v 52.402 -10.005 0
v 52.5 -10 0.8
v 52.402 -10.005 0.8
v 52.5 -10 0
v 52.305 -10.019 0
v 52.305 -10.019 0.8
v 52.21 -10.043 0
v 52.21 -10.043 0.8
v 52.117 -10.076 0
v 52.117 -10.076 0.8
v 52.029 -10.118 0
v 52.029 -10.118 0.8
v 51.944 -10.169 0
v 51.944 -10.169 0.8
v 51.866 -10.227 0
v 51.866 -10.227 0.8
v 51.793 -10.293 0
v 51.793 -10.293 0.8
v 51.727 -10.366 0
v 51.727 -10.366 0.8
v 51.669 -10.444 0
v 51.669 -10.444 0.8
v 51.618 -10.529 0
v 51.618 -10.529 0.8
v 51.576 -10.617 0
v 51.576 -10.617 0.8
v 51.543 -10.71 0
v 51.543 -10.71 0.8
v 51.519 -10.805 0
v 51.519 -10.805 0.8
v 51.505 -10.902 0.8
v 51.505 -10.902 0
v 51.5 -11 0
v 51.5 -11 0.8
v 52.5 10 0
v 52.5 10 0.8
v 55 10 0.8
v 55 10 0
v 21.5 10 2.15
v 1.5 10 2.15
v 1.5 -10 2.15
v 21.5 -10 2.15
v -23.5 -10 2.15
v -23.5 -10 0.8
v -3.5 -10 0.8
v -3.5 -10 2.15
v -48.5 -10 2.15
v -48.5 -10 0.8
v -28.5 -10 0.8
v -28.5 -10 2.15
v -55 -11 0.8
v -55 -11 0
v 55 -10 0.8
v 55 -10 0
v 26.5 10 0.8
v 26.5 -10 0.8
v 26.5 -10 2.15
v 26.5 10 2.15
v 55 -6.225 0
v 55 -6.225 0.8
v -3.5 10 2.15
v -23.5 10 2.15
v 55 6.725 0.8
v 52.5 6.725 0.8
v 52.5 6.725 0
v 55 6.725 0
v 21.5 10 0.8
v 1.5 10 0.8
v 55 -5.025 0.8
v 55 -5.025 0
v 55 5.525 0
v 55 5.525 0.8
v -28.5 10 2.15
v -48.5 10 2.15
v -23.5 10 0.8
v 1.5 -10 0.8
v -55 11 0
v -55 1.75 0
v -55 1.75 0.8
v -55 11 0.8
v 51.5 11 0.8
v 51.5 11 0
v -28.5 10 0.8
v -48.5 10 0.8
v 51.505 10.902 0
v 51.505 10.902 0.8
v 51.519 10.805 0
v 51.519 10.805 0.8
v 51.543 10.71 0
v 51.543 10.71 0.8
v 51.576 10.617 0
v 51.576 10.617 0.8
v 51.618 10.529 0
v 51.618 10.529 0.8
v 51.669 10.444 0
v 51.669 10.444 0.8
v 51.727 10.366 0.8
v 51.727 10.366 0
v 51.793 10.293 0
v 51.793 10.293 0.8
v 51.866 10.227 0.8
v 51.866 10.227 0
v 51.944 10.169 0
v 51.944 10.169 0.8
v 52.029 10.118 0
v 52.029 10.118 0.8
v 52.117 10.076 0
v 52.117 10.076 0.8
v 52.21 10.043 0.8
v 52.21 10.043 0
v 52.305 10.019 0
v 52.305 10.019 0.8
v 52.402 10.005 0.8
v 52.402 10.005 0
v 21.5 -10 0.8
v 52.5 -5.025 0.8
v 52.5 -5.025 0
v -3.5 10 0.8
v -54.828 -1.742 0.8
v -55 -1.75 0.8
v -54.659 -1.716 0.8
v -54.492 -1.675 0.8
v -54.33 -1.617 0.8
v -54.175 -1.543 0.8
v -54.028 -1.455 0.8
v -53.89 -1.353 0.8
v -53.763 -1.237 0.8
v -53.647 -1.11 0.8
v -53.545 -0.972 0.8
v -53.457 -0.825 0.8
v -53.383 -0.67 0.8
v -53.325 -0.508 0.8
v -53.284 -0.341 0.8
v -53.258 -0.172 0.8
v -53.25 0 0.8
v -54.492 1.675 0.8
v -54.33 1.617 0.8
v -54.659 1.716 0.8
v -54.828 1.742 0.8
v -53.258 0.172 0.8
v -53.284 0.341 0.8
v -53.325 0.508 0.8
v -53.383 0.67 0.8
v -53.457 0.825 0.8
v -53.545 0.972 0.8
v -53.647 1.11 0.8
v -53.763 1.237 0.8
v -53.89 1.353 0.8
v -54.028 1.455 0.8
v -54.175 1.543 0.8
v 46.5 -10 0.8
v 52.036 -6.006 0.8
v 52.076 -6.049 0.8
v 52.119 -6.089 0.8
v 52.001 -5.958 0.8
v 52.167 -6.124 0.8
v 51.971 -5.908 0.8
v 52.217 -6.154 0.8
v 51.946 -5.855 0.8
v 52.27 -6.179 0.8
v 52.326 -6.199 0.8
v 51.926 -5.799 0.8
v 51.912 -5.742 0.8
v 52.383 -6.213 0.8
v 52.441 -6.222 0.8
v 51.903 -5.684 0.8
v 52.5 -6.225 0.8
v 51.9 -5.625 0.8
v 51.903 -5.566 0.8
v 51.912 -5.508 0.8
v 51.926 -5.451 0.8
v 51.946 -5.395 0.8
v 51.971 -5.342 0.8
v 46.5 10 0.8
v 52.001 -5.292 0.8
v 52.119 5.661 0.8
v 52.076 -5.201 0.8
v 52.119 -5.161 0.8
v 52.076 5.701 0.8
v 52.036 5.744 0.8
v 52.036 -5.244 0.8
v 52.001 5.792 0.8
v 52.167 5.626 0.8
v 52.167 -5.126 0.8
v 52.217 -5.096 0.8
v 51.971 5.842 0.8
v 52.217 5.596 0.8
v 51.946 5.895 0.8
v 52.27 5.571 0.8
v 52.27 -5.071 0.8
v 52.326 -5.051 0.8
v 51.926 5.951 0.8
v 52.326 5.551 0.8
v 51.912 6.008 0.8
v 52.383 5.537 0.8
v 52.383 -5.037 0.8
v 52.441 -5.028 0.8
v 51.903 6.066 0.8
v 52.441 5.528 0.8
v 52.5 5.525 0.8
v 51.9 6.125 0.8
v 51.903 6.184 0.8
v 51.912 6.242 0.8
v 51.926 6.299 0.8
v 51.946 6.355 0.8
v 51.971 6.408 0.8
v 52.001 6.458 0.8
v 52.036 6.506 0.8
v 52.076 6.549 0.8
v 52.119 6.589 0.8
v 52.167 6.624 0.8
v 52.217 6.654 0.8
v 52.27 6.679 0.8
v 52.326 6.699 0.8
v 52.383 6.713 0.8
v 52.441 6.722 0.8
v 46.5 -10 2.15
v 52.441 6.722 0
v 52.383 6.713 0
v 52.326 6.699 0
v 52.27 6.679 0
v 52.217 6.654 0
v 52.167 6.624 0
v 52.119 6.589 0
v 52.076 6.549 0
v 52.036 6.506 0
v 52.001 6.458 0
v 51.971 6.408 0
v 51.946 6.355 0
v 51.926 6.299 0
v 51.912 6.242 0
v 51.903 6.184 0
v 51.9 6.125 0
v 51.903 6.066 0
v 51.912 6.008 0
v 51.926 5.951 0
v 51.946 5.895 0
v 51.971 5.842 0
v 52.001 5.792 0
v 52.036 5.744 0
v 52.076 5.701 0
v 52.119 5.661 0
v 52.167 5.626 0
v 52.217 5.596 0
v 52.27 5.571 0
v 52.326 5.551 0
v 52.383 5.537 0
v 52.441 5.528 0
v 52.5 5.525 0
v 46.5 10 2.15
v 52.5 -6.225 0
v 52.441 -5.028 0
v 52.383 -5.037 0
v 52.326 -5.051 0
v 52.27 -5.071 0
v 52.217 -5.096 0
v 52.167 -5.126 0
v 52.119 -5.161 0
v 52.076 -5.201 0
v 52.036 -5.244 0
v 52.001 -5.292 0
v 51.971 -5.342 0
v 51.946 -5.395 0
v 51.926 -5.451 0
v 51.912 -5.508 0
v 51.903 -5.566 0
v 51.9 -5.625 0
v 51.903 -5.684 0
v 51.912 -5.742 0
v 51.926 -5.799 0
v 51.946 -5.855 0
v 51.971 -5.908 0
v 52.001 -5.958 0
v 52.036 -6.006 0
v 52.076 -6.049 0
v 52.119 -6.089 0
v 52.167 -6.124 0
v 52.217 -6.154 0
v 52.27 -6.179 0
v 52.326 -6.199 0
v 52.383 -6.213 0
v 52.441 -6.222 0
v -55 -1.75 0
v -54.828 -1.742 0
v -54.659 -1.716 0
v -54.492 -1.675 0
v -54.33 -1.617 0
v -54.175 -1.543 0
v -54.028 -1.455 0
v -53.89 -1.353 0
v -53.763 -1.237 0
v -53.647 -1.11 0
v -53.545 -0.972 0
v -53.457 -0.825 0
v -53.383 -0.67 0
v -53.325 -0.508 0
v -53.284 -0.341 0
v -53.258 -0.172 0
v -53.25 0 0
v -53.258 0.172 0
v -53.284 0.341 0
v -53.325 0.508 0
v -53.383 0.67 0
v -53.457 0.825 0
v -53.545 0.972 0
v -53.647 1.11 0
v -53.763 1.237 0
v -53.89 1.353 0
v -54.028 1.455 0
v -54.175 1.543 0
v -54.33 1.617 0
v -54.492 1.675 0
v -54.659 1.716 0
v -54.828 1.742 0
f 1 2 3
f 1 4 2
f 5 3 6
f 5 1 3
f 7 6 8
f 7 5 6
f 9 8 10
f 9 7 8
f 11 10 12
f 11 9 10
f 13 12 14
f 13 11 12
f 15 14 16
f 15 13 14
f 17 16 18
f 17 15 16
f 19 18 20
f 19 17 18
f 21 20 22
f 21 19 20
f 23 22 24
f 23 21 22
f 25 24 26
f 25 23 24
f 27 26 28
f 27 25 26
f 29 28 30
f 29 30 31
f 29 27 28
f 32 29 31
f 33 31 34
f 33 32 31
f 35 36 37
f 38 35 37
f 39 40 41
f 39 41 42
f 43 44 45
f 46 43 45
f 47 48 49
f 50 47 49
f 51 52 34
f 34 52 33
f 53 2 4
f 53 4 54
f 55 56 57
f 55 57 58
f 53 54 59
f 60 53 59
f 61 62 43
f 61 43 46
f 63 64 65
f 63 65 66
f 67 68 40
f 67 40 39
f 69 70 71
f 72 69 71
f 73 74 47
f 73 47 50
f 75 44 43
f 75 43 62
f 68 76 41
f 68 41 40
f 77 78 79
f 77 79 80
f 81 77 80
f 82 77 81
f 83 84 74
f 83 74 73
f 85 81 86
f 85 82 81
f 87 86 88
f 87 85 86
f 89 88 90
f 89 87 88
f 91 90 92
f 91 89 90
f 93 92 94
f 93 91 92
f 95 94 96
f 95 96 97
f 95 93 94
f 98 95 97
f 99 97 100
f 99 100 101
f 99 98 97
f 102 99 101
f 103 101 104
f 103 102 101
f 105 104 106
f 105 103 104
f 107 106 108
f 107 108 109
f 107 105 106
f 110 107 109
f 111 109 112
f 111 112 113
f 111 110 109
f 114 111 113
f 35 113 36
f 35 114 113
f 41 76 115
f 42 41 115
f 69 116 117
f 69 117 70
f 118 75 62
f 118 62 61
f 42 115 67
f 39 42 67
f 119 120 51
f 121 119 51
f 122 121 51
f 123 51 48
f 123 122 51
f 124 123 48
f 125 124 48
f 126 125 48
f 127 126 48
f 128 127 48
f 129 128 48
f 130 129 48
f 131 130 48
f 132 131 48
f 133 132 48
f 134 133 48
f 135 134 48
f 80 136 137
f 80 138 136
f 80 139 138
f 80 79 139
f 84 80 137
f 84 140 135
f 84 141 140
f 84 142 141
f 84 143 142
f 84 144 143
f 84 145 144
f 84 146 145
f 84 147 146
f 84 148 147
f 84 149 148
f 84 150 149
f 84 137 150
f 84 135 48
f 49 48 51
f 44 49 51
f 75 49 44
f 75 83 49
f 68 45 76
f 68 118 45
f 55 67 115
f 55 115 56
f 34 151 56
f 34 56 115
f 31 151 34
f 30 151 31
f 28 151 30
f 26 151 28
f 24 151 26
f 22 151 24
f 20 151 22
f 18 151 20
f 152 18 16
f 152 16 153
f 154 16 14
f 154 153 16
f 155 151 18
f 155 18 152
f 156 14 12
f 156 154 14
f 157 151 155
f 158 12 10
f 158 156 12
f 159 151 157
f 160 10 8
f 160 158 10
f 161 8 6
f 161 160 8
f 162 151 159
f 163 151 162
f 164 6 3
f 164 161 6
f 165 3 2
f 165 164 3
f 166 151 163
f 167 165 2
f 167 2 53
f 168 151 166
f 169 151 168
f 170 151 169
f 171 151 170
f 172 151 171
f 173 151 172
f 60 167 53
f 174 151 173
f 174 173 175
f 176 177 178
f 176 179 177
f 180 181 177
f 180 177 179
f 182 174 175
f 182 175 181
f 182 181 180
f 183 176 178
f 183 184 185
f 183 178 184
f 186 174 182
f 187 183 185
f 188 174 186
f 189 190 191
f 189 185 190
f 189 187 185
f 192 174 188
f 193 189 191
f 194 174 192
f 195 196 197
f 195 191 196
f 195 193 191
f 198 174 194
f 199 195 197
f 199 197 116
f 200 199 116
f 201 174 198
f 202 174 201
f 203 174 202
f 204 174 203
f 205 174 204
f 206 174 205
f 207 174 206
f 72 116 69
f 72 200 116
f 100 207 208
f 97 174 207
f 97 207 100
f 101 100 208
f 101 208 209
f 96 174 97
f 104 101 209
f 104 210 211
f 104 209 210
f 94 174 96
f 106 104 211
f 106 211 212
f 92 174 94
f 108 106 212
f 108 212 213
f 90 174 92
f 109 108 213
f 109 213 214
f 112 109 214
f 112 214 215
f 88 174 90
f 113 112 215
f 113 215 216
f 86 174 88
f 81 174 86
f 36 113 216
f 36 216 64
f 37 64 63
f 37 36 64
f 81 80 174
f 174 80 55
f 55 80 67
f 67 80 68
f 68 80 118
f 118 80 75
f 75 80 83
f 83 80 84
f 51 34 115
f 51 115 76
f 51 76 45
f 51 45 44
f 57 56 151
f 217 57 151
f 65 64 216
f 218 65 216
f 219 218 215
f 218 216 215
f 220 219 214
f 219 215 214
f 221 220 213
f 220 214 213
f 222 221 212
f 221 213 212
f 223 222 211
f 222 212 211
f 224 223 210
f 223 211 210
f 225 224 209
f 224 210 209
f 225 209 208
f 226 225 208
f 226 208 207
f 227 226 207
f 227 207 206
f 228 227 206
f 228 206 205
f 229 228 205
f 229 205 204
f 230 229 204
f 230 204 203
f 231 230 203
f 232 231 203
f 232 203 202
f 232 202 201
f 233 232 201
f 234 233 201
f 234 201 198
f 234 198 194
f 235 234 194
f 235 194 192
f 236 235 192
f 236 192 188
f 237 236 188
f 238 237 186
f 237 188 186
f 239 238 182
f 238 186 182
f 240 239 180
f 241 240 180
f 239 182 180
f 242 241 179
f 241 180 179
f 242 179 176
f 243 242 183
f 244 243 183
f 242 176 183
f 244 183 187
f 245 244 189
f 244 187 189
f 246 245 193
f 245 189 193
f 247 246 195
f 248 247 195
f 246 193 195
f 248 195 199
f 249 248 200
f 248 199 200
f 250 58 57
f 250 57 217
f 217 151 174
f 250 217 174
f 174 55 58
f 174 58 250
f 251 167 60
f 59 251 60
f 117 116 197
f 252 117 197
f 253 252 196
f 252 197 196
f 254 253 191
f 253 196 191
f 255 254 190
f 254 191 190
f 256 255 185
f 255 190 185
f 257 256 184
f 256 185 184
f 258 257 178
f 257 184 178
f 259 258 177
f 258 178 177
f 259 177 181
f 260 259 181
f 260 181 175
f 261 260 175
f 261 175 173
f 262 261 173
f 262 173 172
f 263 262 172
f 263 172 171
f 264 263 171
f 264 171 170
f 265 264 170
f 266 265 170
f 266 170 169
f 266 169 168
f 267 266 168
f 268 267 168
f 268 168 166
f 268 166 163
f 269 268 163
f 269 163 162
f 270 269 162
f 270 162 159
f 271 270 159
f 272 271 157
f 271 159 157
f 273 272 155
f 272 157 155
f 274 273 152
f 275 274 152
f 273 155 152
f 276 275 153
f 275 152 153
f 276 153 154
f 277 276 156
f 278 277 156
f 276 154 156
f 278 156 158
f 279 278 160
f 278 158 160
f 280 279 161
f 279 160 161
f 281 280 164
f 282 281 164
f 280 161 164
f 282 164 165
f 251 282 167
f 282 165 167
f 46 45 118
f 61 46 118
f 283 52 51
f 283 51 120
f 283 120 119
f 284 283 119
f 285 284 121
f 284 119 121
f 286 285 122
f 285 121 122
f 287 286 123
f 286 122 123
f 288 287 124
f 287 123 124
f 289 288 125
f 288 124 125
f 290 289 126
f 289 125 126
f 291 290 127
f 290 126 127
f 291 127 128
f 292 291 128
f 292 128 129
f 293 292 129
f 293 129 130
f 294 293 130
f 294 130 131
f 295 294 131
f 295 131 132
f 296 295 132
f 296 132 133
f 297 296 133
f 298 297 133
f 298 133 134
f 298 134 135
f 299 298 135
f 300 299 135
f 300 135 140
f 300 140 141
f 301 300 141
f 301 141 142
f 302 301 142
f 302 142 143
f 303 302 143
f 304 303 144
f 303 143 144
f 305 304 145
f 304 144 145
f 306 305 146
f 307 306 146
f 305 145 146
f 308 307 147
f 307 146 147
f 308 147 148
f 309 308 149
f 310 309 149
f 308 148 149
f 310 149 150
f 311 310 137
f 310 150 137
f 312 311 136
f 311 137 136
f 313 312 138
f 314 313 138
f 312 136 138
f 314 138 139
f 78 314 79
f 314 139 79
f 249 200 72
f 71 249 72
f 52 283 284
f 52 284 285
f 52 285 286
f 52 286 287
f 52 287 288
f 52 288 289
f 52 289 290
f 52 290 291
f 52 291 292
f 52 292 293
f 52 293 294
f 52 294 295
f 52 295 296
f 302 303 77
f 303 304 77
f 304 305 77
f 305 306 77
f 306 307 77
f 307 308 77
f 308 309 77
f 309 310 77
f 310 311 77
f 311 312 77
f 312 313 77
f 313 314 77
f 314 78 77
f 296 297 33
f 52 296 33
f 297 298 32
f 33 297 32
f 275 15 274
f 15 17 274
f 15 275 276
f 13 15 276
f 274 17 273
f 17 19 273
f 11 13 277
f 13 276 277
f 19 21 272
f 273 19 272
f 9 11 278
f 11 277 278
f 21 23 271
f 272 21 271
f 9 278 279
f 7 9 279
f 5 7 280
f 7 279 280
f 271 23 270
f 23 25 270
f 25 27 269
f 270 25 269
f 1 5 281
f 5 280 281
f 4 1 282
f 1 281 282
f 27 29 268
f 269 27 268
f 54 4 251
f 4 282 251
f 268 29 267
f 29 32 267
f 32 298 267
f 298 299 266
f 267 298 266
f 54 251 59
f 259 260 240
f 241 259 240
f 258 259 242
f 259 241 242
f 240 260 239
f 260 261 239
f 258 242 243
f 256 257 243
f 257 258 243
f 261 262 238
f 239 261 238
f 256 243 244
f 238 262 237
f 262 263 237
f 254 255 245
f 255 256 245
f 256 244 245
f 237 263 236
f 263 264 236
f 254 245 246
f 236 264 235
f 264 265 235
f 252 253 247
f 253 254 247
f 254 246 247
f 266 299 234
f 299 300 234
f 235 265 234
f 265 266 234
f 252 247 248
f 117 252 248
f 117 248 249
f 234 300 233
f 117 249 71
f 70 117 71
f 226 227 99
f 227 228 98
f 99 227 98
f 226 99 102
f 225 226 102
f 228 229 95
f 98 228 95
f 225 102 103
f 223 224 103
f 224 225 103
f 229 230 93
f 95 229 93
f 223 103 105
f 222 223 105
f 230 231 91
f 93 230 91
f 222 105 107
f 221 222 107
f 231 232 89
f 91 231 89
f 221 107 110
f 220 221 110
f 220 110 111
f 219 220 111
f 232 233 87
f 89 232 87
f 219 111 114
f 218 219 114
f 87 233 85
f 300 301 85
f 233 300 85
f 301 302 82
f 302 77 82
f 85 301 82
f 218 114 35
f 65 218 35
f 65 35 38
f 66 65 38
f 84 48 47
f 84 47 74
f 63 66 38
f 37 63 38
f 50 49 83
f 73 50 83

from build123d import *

# Parameters (mm, degrees)
F0_W     = 110
F0_H     = 22
F1_DEPTH = 0.8
F2_W     = 3.5
F2_H     = 1
F2_W_2   = 2.5
F2_H_2   = 1.2
F3_DEPTH = 0.801
F4_R     = 0.99999
F2_W_3   = 20
F2_H_3   = 20
F5_DEPTH = 1.35


# Not quite as in the source:
# - a fillet or chamfer is up to 0.001 mm smaller than in the source, because OpenCascade refuses the exact size


with BuildPart() as f1:
    # F0 (on Top) → F1 (new body)
    with BuildSketch(Plane.XY):
        Rectangle(F0_W, F0_H)
    extrude(amount=F1_DEPTH)

    # F2 (on face) → F3 (cut, through all)
    with BuildSketch(Plane.XY.offset(0.8)):
        with BuildLine():
            Line((-55, 1.75), (-55, -1.75))
            ThreePointArc((-55, -1.75), (-53.25, 0), (-55, 1.75))
        make_face()
        with Locations((53.25, 10.5)):
            Rectangle(F2_W, F2_H)
        with Locations((53.25, -10.5)):
            Rectangle(F2_W, F2_H)
        with BuildLine():
            ThreePointArc((52.5, -5.025), (51.9, -5.625), (52.5, -6.225))
            Line((52.5, -6.225), (52.5, -5.025))
        make_face()
        with BuildLine():
            Line((52.5, 5.525), (52.5, 6.725))
            ThreePointArc((52.5, 6.725), (51.9, 6.125), (52.5, 5.525))
        make_face()
        with Locations((53.75, -5.625)):
            Rectangle(F2_W_2, F2_H_2)
        with Locations((53.75, 6.125)):
            Rectangle(F2_W_2, F2_H_2)
    extrude(amount=-F3_DEPTH, mode=Mode.SUBTRACT)

    # F4 (radius 1 in the source; OpenCascade refuses exactly that, so slightly less here)
    f4_edges = [f1.edges().sort_by_distance(p)[0] for p in [
        (51.5, -10, 0.4),
        (51.5, 10, 0.4),
    ]]
    fillet(f4_edges, radius=F4_R)

    # F2 (on face) → F5 (join)
    with BuildSketch(Plane.XY.offset(0.8)):
        with Locations((36.5, 0)):
            Rectangle(F2_W_3, F2_H_3)
        with Locations((11.5, 0)):
            Rectangle(F2_W_3, F2_H_3)
        with Locations((-13.5, 0)):
            Rectangle(F2_W_3, F2_H_3)
        with Locations((-38.5, 0)):
            Rectangle(F2_W_3, F2_H_3)
    extrude(amount=F5_DEPTH)


solid = f1.part
